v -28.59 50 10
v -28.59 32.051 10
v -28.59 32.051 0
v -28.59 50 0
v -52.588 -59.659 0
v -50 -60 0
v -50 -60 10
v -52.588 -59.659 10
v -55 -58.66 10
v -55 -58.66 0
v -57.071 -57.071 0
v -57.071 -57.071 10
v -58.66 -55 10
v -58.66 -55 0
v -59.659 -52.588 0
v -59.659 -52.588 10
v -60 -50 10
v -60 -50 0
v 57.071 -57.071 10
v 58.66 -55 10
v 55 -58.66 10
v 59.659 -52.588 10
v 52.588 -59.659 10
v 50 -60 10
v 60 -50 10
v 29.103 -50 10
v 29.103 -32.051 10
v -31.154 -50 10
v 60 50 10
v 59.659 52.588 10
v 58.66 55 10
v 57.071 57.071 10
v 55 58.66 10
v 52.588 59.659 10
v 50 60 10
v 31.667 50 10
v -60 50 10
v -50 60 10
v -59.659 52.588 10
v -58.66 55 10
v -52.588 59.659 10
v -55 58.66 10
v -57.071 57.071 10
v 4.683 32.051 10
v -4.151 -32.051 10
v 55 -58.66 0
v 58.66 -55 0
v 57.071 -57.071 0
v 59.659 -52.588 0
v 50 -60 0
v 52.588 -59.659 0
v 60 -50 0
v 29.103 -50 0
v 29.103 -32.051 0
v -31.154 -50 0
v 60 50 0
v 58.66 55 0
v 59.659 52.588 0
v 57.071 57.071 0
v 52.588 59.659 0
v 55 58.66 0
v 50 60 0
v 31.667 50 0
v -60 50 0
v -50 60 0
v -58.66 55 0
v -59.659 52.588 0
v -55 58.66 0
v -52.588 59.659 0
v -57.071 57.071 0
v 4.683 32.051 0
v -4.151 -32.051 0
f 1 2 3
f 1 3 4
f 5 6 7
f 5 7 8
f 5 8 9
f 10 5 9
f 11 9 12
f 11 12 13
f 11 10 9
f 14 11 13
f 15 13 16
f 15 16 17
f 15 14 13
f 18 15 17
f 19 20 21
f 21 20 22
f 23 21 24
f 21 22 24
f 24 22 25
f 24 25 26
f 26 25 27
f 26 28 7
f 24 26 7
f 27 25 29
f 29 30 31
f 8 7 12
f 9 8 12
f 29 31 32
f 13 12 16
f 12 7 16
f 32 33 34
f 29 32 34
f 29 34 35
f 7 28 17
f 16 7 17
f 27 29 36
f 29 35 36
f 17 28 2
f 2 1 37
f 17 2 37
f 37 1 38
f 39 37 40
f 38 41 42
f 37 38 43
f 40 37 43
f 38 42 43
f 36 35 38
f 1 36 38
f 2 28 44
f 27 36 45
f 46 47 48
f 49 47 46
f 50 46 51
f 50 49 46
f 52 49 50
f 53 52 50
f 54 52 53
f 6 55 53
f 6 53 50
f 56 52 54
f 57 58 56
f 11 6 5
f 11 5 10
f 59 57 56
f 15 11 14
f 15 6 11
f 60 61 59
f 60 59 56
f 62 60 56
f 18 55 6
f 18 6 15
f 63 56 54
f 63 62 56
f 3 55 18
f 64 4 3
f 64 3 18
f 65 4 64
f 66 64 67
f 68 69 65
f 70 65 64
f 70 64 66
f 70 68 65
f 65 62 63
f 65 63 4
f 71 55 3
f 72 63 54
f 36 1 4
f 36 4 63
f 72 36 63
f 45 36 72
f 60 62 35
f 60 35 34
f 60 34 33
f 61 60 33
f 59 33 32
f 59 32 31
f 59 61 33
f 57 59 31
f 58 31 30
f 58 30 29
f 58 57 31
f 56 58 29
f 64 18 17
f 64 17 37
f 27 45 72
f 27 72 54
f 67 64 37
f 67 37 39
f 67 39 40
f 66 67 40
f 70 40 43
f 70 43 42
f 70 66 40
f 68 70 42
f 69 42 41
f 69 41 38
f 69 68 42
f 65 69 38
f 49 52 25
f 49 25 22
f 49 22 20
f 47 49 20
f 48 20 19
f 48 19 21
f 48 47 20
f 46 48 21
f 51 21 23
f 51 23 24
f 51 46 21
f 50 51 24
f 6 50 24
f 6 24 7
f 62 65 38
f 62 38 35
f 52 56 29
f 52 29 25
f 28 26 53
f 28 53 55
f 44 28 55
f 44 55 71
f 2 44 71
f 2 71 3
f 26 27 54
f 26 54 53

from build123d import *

# Parameters (mm, degrees)
BOSS_EXTRUDE1_DEPTH = 10
CUT_EXTRUDE39_DEPTH = 10


with BuildPart() as part:
    # Sketch1 → Boss-Extrude1 (new body)
    with BuildSketch(Plane.XY):
        with BuildLine():
            Line((-50, 60), (50, 60))
            ThreePointArc((50, 60), (57.071067812, 57.071067812), (60, 50))
            Line((60, 50), (60, -50))
            ThreePointArc((60, -50), (57.071067812, -57.071067812), (50, -60))
            Line((50, -60), (-50, -60))
            ThreePointArc((-50, -60), (-57.071067812, -57.071067812), (-60, -50))
            Line((-60, -50), (-60, 50))
            ThreePointArc((-60, 50), (-57.071067812, 57.071067812), (-50, 60))
        make_face()
    extrude(amount=BOSS_EXTRUDE1_DEPTH)

    # Sketch2 → Cut-Extrude39 (cut)
    with BuildSketch(Plane.XY.offset(10)):
        Polygon((-28.58974359, 50), (31.666666667, 50), (-4.150641026, -32.051282051), (29.102564103, -32.051282051), (29.102564103, -50), (-31.153846154, -50), (4.68349359, 32.051282051), (-28.58974359, 32.051282051), align=None)
    extrude(amount=-CUT_EXTRUDE39_DEPTH, mode=Mode.SUBTRACT)


solid = part.part
